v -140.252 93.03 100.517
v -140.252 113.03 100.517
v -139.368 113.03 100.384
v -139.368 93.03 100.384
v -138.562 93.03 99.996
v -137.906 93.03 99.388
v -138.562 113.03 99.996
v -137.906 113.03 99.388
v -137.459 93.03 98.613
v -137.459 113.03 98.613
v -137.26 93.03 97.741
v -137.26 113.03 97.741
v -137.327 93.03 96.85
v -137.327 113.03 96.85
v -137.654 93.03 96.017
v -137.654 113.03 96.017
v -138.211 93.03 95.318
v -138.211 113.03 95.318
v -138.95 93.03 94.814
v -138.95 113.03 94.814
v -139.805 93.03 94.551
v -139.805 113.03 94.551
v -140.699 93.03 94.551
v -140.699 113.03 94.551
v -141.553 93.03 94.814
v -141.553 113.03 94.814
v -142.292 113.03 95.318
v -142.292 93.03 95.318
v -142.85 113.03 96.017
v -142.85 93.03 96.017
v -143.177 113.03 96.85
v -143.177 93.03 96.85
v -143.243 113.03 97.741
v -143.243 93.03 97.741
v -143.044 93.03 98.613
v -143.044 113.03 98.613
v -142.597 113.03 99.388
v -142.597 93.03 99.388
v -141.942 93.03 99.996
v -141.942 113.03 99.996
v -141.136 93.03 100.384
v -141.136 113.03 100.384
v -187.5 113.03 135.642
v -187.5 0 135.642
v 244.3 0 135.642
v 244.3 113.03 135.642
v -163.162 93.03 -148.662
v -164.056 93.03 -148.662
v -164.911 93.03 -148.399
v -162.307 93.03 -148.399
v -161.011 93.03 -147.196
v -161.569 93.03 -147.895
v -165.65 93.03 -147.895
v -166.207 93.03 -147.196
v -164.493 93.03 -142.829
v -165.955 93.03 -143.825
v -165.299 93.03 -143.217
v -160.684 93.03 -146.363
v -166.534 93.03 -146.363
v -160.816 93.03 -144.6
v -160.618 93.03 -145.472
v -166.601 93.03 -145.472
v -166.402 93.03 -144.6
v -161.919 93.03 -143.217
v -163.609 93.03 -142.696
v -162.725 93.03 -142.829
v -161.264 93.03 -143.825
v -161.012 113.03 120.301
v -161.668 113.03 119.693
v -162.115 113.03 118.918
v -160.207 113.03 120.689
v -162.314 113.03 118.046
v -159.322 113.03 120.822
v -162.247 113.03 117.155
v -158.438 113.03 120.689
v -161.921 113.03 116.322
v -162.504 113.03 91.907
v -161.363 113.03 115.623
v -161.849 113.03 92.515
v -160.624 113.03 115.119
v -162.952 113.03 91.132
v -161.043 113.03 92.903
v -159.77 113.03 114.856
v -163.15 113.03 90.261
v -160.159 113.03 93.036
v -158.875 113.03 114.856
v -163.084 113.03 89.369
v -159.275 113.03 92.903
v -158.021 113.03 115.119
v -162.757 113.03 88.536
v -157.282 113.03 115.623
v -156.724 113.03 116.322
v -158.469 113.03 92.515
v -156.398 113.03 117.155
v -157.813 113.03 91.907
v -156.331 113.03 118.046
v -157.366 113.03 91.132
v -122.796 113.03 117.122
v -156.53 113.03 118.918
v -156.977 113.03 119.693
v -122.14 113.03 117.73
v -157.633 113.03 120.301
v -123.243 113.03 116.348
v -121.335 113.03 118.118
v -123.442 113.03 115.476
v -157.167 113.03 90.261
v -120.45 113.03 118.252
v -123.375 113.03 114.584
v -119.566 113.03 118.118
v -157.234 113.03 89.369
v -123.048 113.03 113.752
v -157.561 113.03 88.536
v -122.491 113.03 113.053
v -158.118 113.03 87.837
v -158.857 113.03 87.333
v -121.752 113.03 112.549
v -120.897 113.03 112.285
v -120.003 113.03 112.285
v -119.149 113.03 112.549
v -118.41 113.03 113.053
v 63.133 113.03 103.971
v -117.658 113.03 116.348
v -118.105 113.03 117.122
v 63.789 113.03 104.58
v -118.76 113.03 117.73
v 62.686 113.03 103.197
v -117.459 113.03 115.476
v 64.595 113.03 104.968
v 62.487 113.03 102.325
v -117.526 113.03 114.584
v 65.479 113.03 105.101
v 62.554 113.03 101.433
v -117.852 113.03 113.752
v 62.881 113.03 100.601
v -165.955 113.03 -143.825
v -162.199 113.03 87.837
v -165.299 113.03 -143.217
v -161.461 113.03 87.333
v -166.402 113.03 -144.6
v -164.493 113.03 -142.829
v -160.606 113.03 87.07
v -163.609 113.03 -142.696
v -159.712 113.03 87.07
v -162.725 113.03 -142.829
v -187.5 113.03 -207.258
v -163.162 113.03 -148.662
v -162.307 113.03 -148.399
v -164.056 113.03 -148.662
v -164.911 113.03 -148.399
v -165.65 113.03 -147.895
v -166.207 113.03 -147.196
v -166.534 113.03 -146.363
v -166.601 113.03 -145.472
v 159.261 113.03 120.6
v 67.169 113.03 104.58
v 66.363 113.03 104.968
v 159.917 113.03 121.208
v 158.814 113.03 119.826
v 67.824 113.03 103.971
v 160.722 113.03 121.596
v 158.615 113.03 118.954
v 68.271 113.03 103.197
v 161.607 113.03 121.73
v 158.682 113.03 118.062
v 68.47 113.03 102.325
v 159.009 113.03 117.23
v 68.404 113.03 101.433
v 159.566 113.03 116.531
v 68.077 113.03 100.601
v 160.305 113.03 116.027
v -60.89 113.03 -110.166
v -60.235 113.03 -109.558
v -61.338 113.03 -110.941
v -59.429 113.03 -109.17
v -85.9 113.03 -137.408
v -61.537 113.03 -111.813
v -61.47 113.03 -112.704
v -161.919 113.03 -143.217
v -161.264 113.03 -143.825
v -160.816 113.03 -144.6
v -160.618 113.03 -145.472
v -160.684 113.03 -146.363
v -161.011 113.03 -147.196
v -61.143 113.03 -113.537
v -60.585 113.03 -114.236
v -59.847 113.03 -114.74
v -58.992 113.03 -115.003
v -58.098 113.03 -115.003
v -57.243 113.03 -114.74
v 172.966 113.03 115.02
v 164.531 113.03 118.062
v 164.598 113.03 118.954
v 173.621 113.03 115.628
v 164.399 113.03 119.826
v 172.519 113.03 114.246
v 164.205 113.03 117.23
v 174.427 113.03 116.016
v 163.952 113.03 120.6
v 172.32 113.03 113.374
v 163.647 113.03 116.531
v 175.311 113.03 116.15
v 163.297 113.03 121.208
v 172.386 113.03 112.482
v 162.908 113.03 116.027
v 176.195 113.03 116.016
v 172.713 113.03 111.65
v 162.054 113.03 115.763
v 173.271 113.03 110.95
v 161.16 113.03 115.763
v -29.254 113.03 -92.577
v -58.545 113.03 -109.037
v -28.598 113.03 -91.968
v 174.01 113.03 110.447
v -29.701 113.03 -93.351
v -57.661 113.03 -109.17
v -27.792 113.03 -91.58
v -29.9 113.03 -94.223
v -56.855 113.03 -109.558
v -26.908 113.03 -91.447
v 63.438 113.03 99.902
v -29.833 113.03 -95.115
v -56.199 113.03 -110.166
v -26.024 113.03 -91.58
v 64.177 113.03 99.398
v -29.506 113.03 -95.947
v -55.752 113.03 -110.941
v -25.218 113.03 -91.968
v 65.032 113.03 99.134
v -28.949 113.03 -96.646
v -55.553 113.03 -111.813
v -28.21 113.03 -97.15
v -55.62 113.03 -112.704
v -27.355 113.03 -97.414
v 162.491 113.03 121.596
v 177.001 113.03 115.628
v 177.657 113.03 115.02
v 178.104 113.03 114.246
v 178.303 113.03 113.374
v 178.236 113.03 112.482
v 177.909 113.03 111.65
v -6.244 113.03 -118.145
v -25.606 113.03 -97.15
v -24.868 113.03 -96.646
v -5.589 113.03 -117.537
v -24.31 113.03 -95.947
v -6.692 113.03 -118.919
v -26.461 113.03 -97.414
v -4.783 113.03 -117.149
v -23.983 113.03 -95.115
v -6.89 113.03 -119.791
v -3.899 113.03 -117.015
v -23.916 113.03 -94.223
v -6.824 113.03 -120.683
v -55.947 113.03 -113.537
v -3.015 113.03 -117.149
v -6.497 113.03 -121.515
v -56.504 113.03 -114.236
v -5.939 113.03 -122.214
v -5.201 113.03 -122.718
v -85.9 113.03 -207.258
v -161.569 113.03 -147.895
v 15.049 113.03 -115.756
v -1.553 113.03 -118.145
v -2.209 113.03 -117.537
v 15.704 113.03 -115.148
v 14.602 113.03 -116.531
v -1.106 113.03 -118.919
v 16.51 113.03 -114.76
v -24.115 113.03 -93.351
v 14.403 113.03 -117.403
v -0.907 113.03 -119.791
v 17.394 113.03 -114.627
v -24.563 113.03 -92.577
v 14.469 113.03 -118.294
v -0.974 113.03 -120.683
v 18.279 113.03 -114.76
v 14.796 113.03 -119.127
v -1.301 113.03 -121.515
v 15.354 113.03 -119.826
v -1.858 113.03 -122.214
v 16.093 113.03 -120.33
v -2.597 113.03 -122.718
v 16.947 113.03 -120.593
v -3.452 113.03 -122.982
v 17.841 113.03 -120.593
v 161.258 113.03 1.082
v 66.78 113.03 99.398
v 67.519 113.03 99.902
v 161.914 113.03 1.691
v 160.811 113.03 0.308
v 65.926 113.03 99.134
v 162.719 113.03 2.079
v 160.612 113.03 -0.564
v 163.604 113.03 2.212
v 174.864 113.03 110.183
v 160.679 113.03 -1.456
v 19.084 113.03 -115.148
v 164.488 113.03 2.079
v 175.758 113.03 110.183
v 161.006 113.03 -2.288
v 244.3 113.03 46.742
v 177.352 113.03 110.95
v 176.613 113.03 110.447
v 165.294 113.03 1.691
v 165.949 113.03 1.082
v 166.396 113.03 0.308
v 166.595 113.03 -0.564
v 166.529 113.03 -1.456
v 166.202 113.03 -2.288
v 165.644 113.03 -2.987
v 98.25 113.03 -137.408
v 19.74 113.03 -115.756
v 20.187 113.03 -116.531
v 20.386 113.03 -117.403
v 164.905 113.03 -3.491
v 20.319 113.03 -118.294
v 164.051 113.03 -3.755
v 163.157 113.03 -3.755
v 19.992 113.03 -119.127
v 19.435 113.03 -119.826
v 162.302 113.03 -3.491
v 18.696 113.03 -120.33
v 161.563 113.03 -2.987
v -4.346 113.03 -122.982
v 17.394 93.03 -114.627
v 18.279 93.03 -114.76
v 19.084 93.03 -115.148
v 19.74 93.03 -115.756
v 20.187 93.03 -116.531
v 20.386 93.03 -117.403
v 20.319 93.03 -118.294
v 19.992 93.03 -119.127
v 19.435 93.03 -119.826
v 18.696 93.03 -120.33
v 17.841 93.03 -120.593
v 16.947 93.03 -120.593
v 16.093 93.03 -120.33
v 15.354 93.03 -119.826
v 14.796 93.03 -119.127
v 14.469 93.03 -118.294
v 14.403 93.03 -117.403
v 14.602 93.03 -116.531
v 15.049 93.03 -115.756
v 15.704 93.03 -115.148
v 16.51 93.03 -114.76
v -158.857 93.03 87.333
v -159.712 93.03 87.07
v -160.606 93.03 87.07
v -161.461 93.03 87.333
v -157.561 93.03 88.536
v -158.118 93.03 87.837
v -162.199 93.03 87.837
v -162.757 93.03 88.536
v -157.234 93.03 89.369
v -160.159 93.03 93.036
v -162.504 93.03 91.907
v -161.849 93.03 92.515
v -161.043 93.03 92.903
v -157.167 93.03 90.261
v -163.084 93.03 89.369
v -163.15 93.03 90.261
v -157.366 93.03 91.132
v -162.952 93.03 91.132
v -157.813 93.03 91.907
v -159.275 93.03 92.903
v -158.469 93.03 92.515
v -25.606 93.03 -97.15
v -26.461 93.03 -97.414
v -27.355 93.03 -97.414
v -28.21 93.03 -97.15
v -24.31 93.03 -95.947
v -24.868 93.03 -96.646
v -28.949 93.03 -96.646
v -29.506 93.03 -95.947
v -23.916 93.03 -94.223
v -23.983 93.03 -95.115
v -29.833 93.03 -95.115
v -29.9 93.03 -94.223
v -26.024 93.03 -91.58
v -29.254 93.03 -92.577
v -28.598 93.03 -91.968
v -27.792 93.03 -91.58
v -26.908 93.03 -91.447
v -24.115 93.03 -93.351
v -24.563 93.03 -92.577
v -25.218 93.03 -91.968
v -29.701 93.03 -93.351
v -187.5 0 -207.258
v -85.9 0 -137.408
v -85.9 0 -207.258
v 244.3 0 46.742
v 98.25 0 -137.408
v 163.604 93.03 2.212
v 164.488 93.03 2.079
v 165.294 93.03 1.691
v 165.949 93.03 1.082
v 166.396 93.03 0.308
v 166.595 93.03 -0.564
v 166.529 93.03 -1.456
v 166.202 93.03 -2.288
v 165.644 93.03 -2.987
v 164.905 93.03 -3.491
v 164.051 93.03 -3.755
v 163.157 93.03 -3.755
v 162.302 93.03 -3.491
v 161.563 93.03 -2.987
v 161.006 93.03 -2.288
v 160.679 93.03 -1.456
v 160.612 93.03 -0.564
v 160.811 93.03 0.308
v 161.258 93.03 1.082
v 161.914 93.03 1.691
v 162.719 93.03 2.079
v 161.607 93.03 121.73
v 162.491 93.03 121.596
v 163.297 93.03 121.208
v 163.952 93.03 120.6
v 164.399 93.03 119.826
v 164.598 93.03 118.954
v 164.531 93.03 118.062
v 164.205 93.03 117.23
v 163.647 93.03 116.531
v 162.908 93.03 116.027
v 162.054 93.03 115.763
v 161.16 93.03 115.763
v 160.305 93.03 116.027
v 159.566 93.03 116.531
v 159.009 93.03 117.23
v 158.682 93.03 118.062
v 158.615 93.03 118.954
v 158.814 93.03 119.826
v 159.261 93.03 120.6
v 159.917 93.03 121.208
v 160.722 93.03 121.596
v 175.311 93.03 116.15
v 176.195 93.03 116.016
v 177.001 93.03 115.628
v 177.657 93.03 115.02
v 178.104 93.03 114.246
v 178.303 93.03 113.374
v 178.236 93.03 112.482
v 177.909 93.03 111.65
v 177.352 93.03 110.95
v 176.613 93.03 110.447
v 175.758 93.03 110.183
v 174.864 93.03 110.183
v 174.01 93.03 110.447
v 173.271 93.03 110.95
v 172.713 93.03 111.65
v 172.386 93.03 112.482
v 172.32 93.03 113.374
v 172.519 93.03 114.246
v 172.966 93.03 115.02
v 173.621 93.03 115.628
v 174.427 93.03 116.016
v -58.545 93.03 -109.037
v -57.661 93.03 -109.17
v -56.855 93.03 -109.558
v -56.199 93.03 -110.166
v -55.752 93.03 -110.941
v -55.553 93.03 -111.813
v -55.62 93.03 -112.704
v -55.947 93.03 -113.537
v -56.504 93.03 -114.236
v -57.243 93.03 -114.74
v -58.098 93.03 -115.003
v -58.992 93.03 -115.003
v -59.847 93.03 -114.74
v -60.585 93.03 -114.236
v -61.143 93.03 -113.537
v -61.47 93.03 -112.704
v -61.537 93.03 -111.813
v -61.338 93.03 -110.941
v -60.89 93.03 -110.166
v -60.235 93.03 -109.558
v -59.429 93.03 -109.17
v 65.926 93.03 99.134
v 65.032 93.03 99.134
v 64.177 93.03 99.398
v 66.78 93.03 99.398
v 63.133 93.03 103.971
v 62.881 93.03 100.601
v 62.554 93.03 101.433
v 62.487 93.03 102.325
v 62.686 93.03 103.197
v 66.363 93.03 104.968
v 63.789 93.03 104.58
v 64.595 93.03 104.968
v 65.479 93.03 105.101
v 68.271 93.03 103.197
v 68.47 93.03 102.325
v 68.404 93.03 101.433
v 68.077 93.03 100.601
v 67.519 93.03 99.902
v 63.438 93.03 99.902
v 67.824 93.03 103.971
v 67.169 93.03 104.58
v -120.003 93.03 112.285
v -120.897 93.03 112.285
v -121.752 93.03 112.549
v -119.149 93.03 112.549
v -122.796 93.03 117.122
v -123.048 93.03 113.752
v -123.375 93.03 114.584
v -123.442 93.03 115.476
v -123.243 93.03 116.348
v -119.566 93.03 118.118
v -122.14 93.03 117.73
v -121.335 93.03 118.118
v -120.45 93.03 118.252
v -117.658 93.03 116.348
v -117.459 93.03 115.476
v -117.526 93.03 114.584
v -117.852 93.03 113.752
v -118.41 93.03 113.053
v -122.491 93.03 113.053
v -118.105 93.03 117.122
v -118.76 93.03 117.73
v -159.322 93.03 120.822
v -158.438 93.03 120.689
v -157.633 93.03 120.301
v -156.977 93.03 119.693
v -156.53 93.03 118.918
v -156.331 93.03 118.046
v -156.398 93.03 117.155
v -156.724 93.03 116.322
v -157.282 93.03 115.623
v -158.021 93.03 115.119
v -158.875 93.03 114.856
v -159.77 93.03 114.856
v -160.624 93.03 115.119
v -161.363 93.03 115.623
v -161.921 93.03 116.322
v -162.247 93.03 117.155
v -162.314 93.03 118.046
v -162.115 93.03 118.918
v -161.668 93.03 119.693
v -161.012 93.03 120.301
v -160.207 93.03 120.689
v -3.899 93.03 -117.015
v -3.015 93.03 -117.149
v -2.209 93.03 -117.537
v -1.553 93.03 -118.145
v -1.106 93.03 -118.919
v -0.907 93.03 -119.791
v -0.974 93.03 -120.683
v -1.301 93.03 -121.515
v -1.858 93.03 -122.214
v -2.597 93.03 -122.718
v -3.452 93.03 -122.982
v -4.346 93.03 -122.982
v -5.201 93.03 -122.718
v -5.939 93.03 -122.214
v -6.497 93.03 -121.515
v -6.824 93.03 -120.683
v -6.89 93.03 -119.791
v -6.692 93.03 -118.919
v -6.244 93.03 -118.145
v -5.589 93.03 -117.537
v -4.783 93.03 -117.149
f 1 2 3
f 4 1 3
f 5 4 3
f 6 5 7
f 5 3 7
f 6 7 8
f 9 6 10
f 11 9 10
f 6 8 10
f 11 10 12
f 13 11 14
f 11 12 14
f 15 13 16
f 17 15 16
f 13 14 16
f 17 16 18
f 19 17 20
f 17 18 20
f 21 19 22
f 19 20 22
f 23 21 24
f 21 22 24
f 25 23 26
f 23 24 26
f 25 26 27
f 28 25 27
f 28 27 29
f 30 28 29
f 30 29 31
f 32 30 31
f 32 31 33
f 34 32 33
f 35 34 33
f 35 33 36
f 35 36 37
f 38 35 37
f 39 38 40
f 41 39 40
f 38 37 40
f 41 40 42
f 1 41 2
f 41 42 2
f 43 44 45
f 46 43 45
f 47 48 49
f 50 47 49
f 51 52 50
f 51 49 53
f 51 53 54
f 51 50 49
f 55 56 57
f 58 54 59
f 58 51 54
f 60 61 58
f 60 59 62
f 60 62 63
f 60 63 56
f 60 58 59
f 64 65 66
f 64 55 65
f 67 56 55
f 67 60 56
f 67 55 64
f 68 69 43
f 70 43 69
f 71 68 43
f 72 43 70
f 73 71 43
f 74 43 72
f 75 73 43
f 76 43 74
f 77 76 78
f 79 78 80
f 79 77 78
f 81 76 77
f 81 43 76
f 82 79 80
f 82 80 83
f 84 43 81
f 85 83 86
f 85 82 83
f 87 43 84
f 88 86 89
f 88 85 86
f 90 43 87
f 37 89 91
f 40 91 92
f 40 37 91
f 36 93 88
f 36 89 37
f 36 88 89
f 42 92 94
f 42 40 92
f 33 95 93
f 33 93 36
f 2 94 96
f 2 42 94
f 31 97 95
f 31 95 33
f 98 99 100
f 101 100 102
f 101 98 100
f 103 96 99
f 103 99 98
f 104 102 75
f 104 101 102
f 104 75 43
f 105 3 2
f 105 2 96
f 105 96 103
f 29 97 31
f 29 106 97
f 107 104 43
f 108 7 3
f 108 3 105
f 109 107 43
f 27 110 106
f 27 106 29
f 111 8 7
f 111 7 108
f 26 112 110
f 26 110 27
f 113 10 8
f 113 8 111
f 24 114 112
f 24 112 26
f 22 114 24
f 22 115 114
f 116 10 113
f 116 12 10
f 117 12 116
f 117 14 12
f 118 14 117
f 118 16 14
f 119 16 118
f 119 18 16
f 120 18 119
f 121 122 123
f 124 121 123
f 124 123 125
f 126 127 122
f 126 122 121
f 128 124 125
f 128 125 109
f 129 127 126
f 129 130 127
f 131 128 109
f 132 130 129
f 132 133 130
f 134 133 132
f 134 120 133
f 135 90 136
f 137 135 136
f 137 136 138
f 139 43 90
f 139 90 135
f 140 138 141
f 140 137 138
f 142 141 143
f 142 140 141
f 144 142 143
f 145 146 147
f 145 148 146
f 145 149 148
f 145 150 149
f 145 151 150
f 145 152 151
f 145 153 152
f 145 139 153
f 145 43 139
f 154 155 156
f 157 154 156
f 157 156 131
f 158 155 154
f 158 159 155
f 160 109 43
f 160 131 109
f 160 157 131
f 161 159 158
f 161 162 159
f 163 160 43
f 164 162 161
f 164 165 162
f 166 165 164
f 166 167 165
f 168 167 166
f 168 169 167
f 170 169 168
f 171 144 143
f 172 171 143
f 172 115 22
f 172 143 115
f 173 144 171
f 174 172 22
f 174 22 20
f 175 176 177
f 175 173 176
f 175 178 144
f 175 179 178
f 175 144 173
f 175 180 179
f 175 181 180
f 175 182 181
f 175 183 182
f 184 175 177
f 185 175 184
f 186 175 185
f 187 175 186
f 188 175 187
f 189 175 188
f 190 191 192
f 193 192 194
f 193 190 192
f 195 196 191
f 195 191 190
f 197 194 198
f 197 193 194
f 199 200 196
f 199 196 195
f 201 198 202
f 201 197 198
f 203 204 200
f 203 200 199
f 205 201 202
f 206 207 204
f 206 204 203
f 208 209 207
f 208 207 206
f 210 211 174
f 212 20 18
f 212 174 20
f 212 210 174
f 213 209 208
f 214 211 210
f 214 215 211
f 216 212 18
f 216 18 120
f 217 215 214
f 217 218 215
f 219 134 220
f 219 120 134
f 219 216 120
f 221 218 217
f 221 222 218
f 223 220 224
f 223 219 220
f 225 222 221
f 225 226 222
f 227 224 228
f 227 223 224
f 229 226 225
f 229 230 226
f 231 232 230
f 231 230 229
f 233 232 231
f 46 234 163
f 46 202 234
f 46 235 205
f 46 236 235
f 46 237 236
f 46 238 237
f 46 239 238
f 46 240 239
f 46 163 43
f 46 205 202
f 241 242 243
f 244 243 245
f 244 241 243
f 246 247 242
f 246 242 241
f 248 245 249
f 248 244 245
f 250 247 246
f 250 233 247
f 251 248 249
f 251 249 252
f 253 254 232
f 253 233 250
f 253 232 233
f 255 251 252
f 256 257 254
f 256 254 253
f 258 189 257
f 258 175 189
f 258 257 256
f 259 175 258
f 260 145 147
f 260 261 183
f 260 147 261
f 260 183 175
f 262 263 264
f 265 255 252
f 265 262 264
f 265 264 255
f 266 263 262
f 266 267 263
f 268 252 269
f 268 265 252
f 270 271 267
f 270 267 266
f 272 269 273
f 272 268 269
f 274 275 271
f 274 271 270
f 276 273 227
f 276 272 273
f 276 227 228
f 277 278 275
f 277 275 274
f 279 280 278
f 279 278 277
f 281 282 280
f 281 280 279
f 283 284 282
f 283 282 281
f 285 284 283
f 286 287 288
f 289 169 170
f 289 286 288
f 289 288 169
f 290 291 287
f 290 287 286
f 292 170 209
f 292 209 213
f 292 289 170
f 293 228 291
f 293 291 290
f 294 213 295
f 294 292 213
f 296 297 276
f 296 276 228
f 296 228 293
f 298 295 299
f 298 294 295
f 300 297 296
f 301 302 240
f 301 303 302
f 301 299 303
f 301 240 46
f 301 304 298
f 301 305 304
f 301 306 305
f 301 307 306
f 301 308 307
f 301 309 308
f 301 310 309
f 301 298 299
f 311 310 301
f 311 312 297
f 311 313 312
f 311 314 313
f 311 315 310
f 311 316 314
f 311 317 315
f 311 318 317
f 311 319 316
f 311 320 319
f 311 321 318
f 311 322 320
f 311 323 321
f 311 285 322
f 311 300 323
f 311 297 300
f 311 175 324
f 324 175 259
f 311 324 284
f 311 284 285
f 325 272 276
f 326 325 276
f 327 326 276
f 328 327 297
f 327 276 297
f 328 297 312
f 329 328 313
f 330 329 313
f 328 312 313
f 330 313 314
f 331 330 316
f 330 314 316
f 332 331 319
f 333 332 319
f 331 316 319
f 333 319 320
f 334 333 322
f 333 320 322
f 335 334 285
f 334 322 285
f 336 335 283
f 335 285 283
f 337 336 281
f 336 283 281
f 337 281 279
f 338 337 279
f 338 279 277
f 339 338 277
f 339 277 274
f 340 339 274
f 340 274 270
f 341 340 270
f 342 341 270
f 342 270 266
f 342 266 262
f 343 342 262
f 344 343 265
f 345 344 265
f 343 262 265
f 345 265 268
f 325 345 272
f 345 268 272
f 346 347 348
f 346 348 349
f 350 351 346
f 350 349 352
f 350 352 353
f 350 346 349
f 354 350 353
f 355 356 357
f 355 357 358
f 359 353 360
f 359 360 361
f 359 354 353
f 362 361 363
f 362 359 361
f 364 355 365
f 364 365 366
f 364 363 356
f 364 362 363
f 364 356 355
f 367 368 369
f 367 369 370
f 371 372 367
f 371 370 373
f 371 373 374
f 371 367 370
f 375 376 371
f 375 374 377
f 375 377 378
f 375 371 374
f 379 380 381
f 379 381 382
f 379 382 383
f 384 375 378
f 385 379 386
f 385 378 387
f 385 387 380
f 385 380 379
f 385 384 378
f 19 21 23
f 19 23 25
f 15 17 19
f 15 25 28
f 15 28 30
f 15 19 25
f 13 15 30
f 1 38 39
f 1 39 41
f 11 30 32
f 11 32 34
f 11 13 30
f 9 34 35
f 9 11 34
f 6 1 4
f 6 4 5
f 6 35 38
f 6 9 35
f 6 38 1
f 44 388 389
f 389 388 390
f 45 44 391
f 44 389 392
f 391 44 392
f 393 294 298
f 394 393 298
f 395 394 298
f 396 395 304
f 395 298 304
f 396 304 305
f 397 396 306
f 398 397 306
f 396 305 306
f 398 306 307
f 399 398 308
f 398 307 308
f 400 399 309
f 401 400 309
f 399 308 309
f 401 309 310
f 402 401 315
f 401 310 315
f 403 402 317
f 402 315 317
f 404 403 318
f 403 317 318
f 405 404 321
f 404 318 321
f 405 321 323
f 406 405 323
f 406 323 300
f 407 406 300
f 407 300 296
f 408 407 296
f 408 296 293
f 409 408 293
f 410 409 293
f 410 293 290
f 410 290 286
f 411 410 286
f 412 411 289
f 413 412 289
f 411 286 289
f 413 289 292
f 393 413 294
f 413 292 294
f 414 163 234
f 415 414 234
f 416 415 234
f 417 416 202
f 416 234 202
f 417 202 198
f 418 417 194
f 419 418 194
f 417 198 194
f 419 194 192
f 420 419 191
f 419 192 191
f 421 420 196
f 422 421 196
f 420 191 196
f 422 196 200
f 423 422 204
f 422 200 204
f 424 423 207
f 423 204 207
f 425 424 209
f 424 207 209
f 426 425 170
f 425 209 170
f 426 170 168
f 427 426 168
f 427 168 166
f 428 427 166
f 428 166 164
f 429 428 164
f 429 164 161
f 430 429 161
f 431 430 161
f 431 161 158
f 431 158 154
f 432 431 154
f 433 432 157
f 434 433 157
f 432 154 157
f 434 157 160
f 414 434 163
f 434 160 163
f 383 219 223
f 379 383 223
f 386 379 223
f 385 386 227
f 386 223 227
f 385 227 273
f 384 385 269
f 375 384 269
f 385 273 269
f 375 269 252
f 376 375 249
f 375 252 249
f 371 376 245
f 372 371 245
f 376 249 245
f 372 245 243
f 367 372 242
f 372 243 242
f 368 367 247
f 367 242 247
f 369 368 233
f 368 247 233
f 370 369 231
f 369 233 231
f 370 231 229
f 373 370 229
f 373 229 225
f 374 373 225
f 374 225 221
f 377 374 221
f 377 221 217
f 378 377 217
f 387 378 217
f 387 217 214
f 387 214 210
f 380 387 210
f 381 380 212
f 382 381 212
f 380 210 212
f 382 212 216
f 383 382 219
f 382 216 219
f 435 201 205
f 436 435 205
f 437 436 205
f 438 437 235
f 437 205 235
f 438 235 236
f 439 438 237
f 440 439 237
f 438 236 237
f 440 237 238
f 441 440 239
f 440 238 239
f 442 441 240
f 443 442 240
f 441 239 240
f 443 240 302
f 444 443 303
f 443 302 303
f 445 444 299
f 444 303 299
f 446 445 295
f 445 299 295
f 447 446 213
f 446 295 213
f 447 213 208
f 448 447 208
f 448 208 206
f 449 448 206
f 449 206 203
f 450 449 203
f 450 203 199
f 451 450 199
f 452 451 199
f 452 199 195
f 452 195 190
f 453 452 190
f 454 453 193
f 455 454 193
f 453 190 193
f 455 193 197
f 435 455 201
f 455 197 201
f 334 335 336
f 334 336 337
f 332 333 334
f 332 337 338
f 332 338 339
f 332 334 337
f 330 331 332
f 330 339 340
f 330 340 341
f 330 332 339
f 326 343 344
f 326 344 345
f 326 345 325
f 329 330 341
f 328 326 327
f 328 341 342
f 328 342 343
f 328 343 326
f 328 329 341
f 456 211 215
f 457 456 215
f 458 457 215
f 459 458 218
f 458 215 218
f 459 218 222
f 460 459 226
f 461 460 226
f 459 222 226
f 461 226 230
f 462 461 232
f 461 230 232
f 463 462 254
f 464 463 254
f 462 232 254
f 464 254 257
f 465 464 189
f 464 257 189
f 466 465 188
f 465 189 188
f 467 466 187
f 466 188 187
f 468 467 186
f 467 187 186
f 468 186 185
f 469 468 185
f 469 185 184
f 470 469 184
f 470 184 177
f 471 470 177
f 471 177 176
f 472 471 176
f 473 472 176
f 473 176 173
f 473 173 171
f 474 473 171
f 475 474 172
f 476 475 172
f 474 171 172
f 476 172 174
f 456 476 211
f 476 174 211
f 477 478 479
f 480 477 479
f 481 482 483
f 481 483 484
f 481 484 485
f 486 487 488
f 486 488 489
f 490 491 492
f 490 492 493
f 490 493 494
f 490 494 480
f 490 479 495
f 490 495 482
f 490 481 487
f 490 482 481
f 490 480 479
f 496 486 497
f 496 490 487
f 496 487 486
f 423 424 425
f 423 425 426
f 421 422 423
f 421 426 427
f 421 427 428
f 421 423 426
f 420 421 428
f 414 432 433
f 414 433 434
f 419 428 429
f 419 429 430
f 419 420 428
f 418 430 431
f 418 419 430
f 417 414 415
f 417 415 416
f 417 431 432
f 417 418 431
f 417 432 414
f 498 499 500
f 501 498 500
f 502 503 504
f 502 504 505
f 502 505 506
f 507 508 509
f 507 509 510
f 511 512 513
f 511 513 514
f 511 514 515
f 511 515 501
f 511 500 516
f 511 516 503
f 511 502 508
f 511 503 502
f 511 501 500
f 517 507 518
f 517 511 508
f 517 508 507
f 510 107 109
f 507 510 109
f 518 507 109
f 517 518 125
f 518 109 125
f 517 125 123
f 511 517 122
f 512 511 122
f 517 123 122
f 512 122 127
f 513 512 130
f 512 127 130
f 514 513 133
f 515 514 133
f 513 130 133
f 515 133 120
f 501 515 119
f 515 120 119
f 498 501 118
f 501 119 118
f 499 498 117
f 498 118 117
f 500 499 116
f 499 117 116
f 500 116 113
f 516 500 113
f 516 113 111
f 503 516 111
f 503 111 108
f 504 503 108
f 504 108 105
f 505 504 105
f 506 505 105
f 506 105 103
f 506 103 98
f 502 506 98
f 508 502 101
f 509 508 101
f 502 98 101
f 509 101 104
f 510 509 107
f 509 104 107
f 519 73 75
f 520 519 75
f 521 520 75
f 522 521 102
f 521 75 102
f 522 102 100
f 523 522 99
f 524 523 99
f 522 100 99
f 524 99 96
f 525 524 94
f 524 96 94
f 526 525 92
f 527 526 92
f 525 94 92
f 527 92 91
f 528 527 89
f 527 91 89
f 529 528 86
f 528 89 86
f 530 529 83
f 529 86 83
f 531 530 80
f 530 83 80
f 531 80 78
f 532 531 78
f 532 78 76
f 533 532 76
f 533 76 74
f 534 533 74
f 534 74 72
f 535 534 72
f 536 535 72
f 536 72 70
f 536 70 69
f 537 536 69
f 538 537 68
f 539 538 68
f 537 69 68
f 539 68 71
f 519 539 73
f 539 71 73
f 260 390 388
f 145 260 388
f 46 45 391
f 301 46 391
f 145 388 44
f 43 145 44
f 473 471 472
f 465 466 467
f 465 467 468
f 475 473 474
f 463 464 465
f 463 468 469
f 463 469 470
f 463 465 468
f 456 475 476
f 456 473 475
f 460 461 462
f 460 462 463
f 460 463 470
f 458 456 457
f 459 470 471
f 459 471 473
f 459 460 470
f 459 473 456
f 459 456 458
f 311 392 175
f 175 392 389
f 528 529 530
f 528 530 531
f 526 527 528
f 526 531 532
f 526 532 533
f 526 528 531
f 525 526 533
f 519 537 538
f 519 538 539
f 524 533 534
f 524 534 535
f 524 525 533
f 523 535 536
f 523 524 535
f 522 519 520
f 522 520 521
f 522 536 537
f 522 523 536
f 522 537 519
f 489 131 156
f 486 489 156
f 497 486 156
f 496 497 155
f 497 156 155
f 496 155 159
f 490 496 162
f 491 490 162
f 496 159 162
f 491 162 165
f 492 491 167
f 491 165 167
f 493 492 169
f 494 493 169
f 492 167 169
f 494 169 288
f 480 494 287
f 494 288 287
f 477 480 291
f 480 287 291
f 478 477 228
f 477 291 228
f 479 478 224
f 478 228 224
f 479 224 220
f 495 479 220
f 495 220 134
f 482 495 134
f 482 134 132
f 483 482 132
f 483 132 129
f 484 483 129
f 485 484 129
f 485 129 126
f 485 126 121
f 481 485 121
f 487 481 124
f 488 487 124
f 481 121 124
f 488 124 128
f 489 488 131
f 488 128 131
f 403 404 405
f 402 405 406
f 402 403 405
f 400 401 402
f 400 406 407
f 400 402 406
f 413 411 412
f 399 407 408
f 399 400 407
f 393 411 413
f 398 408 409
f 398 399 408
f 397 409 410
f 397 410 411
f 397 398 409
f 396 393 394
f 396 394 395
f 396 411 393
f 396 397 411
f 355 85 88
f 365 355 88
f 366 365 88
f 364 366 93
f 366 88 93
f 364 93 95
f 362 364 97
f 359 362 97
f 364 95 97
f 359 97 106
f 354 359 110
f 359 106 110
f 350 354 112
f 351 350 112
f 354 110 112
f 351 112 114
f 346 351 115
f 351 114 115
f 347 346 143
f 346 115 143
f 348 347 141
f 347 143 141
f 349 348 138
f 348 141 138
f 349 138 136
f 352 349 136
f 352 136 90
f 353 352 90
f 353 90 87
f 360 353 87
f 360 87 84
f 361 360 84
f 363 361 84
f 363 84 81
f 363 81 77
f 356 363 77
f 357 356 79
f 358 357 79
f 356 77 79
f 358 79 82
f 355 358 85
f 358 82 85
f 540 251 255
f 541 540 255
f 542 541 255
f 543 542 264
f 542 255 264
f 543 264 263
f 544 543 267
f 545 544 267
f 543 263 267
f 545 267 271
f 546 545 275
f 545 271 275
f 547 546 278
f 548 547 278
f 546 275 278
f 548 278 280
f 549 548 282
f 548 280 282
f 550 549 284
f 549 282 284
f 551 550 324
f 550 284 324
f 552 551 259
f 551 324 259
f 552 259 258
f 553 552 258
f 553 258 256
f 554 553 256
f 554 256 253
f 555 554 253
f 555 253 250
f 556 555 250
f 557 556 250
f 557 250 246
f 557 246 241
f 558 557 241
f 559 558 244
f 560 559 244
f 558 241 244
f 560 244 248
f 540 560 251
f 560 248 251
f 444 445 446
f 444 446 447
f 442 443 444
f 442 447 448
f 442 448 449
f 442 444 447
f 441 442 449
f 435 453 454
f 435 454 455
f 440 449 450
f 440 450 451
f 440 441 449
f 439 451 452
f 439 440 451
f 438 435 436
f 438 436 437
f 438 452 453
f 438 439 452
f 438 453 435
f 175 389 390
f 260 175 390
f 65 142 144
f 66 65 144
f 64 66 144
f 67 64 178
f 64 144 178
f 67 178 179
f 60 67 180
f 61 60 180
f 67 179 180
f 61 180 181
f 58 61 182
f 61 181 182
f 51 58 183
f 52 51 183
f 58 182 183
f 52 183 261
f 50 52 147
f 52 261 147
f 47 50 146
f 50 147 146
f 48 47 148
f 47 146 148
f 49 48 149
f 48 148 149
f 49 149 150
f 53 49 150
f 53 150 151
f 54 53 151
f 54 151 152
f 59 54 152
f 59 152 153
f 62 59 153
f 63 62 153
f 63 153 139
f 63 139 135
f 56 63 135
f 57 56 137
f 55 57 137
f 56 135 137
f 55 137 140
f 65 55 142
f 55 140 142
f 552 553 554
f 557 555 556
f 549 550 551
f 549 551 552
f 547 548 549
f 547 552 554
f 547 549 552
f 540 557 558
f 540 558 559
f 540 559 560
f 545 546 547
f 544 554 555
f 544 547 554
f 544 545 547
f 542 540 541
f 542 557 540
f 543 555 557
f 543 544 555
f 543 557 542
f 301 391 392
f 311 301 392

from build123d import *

# Parameters (mm, degrees)
ALUMINUM_BLOCK_DEPTH = 113.03
A_ARM_SKETCHES_R     = 3
A_ARM_HOLES_DEPTH    = 20


with BuildPart() as part:
    # Sketch1 → ALUMINUM BLOCK (new body)
    with BuildSketch(Plane(origin=(0, 0, 0), x_dir=(1, 0, 0), z_dir=(0, 1, 0))):
        Polygon((-187.5, -135.642424533), (244.3, -135.642424533), (244.3, -46.742424533), (98.25, 137.407575467), (-85.9, 137.407575467), (-85.9, 207.257575467), (-187.5, 207.257575467), align=None)
    extrude(amount=ALUMINUM_BLOCK_DEPTH)

    # A-ARM SKETCHES → A-ARM HOLES (cut)
    with BuildSketch(Plane(origin=(0, 113.03, 0), x_dir=(1, 0, 0), z_dir=(0, 1, 0))):
        with Locations(Location((-163.609115423, 145.695818662, 0), (0, 0, 270))):
            Circle(A_ARM_SKETCHES_R)
        with Locations(Location((-3.898882545, 120.015251172, 0), (0, 0, 270))):
            Circle(A_ARM_SKETCHES_R)
        with Locations(Location((175.311223127, -113.149569553, 0), (0, 0, 270))):
            Circle(A_ARM_SKETCHES_R)
        with Locations(Location((-160.15888427, -90.036396379, 0), (0, 0, 270))):
            Circle(A_ARM_SKETCHES_R)
        with Locations(Location((-159.322465718, -117.822298669, 0), (0, 0, 270))):
            Circle(A_ARM_SKETCHES_R)
        with Locations(Location((-120.450372331, -115.251672549, 0), (0, 0, 270))):
            Circle(A_ARM_SKETCHES_R)
        with Locations(Location((-58.544962433, 112.036813196, 0), (0, 0, 270))):
            Circle(A_ARM_SKETCHES_R)
        with Locations(Location((65.478811369, -102.10088587, 0), (0, 0, 270))):
            Circle(A_ARM_SKETCHES_R)
        with Locations(Location((163.603739253, 0.788099457, 0), (0, 0, 270))):
            Circle(A_ARM_SKETCHES_R)
        with Locations(Location((161.606684995, -118.729685562, 0), (0, 0, 270))):
            Circle(A_ARM_SKETCHES_R)
        with Locations(Location((-140.251816154, -97.517207608, 0), (0, 0, 270))):
            Circle(A_ARM_SKETCHES_R)
        with Locations(Location((17.394243717, 117.626925231, 0), (0, 0, 270))):
            Circle(A_ARM_SKETCHES_R)
        with Locations(Location((-26.908089244, 94.447121648, 0), (0, 0, 270))):
            Circle(A_ARM_SKETCHES_R)
    extrude(amount=-A_ARM_HOLES_DEPTH, mode=Mode.SUBTRACT)


solid = part.part
